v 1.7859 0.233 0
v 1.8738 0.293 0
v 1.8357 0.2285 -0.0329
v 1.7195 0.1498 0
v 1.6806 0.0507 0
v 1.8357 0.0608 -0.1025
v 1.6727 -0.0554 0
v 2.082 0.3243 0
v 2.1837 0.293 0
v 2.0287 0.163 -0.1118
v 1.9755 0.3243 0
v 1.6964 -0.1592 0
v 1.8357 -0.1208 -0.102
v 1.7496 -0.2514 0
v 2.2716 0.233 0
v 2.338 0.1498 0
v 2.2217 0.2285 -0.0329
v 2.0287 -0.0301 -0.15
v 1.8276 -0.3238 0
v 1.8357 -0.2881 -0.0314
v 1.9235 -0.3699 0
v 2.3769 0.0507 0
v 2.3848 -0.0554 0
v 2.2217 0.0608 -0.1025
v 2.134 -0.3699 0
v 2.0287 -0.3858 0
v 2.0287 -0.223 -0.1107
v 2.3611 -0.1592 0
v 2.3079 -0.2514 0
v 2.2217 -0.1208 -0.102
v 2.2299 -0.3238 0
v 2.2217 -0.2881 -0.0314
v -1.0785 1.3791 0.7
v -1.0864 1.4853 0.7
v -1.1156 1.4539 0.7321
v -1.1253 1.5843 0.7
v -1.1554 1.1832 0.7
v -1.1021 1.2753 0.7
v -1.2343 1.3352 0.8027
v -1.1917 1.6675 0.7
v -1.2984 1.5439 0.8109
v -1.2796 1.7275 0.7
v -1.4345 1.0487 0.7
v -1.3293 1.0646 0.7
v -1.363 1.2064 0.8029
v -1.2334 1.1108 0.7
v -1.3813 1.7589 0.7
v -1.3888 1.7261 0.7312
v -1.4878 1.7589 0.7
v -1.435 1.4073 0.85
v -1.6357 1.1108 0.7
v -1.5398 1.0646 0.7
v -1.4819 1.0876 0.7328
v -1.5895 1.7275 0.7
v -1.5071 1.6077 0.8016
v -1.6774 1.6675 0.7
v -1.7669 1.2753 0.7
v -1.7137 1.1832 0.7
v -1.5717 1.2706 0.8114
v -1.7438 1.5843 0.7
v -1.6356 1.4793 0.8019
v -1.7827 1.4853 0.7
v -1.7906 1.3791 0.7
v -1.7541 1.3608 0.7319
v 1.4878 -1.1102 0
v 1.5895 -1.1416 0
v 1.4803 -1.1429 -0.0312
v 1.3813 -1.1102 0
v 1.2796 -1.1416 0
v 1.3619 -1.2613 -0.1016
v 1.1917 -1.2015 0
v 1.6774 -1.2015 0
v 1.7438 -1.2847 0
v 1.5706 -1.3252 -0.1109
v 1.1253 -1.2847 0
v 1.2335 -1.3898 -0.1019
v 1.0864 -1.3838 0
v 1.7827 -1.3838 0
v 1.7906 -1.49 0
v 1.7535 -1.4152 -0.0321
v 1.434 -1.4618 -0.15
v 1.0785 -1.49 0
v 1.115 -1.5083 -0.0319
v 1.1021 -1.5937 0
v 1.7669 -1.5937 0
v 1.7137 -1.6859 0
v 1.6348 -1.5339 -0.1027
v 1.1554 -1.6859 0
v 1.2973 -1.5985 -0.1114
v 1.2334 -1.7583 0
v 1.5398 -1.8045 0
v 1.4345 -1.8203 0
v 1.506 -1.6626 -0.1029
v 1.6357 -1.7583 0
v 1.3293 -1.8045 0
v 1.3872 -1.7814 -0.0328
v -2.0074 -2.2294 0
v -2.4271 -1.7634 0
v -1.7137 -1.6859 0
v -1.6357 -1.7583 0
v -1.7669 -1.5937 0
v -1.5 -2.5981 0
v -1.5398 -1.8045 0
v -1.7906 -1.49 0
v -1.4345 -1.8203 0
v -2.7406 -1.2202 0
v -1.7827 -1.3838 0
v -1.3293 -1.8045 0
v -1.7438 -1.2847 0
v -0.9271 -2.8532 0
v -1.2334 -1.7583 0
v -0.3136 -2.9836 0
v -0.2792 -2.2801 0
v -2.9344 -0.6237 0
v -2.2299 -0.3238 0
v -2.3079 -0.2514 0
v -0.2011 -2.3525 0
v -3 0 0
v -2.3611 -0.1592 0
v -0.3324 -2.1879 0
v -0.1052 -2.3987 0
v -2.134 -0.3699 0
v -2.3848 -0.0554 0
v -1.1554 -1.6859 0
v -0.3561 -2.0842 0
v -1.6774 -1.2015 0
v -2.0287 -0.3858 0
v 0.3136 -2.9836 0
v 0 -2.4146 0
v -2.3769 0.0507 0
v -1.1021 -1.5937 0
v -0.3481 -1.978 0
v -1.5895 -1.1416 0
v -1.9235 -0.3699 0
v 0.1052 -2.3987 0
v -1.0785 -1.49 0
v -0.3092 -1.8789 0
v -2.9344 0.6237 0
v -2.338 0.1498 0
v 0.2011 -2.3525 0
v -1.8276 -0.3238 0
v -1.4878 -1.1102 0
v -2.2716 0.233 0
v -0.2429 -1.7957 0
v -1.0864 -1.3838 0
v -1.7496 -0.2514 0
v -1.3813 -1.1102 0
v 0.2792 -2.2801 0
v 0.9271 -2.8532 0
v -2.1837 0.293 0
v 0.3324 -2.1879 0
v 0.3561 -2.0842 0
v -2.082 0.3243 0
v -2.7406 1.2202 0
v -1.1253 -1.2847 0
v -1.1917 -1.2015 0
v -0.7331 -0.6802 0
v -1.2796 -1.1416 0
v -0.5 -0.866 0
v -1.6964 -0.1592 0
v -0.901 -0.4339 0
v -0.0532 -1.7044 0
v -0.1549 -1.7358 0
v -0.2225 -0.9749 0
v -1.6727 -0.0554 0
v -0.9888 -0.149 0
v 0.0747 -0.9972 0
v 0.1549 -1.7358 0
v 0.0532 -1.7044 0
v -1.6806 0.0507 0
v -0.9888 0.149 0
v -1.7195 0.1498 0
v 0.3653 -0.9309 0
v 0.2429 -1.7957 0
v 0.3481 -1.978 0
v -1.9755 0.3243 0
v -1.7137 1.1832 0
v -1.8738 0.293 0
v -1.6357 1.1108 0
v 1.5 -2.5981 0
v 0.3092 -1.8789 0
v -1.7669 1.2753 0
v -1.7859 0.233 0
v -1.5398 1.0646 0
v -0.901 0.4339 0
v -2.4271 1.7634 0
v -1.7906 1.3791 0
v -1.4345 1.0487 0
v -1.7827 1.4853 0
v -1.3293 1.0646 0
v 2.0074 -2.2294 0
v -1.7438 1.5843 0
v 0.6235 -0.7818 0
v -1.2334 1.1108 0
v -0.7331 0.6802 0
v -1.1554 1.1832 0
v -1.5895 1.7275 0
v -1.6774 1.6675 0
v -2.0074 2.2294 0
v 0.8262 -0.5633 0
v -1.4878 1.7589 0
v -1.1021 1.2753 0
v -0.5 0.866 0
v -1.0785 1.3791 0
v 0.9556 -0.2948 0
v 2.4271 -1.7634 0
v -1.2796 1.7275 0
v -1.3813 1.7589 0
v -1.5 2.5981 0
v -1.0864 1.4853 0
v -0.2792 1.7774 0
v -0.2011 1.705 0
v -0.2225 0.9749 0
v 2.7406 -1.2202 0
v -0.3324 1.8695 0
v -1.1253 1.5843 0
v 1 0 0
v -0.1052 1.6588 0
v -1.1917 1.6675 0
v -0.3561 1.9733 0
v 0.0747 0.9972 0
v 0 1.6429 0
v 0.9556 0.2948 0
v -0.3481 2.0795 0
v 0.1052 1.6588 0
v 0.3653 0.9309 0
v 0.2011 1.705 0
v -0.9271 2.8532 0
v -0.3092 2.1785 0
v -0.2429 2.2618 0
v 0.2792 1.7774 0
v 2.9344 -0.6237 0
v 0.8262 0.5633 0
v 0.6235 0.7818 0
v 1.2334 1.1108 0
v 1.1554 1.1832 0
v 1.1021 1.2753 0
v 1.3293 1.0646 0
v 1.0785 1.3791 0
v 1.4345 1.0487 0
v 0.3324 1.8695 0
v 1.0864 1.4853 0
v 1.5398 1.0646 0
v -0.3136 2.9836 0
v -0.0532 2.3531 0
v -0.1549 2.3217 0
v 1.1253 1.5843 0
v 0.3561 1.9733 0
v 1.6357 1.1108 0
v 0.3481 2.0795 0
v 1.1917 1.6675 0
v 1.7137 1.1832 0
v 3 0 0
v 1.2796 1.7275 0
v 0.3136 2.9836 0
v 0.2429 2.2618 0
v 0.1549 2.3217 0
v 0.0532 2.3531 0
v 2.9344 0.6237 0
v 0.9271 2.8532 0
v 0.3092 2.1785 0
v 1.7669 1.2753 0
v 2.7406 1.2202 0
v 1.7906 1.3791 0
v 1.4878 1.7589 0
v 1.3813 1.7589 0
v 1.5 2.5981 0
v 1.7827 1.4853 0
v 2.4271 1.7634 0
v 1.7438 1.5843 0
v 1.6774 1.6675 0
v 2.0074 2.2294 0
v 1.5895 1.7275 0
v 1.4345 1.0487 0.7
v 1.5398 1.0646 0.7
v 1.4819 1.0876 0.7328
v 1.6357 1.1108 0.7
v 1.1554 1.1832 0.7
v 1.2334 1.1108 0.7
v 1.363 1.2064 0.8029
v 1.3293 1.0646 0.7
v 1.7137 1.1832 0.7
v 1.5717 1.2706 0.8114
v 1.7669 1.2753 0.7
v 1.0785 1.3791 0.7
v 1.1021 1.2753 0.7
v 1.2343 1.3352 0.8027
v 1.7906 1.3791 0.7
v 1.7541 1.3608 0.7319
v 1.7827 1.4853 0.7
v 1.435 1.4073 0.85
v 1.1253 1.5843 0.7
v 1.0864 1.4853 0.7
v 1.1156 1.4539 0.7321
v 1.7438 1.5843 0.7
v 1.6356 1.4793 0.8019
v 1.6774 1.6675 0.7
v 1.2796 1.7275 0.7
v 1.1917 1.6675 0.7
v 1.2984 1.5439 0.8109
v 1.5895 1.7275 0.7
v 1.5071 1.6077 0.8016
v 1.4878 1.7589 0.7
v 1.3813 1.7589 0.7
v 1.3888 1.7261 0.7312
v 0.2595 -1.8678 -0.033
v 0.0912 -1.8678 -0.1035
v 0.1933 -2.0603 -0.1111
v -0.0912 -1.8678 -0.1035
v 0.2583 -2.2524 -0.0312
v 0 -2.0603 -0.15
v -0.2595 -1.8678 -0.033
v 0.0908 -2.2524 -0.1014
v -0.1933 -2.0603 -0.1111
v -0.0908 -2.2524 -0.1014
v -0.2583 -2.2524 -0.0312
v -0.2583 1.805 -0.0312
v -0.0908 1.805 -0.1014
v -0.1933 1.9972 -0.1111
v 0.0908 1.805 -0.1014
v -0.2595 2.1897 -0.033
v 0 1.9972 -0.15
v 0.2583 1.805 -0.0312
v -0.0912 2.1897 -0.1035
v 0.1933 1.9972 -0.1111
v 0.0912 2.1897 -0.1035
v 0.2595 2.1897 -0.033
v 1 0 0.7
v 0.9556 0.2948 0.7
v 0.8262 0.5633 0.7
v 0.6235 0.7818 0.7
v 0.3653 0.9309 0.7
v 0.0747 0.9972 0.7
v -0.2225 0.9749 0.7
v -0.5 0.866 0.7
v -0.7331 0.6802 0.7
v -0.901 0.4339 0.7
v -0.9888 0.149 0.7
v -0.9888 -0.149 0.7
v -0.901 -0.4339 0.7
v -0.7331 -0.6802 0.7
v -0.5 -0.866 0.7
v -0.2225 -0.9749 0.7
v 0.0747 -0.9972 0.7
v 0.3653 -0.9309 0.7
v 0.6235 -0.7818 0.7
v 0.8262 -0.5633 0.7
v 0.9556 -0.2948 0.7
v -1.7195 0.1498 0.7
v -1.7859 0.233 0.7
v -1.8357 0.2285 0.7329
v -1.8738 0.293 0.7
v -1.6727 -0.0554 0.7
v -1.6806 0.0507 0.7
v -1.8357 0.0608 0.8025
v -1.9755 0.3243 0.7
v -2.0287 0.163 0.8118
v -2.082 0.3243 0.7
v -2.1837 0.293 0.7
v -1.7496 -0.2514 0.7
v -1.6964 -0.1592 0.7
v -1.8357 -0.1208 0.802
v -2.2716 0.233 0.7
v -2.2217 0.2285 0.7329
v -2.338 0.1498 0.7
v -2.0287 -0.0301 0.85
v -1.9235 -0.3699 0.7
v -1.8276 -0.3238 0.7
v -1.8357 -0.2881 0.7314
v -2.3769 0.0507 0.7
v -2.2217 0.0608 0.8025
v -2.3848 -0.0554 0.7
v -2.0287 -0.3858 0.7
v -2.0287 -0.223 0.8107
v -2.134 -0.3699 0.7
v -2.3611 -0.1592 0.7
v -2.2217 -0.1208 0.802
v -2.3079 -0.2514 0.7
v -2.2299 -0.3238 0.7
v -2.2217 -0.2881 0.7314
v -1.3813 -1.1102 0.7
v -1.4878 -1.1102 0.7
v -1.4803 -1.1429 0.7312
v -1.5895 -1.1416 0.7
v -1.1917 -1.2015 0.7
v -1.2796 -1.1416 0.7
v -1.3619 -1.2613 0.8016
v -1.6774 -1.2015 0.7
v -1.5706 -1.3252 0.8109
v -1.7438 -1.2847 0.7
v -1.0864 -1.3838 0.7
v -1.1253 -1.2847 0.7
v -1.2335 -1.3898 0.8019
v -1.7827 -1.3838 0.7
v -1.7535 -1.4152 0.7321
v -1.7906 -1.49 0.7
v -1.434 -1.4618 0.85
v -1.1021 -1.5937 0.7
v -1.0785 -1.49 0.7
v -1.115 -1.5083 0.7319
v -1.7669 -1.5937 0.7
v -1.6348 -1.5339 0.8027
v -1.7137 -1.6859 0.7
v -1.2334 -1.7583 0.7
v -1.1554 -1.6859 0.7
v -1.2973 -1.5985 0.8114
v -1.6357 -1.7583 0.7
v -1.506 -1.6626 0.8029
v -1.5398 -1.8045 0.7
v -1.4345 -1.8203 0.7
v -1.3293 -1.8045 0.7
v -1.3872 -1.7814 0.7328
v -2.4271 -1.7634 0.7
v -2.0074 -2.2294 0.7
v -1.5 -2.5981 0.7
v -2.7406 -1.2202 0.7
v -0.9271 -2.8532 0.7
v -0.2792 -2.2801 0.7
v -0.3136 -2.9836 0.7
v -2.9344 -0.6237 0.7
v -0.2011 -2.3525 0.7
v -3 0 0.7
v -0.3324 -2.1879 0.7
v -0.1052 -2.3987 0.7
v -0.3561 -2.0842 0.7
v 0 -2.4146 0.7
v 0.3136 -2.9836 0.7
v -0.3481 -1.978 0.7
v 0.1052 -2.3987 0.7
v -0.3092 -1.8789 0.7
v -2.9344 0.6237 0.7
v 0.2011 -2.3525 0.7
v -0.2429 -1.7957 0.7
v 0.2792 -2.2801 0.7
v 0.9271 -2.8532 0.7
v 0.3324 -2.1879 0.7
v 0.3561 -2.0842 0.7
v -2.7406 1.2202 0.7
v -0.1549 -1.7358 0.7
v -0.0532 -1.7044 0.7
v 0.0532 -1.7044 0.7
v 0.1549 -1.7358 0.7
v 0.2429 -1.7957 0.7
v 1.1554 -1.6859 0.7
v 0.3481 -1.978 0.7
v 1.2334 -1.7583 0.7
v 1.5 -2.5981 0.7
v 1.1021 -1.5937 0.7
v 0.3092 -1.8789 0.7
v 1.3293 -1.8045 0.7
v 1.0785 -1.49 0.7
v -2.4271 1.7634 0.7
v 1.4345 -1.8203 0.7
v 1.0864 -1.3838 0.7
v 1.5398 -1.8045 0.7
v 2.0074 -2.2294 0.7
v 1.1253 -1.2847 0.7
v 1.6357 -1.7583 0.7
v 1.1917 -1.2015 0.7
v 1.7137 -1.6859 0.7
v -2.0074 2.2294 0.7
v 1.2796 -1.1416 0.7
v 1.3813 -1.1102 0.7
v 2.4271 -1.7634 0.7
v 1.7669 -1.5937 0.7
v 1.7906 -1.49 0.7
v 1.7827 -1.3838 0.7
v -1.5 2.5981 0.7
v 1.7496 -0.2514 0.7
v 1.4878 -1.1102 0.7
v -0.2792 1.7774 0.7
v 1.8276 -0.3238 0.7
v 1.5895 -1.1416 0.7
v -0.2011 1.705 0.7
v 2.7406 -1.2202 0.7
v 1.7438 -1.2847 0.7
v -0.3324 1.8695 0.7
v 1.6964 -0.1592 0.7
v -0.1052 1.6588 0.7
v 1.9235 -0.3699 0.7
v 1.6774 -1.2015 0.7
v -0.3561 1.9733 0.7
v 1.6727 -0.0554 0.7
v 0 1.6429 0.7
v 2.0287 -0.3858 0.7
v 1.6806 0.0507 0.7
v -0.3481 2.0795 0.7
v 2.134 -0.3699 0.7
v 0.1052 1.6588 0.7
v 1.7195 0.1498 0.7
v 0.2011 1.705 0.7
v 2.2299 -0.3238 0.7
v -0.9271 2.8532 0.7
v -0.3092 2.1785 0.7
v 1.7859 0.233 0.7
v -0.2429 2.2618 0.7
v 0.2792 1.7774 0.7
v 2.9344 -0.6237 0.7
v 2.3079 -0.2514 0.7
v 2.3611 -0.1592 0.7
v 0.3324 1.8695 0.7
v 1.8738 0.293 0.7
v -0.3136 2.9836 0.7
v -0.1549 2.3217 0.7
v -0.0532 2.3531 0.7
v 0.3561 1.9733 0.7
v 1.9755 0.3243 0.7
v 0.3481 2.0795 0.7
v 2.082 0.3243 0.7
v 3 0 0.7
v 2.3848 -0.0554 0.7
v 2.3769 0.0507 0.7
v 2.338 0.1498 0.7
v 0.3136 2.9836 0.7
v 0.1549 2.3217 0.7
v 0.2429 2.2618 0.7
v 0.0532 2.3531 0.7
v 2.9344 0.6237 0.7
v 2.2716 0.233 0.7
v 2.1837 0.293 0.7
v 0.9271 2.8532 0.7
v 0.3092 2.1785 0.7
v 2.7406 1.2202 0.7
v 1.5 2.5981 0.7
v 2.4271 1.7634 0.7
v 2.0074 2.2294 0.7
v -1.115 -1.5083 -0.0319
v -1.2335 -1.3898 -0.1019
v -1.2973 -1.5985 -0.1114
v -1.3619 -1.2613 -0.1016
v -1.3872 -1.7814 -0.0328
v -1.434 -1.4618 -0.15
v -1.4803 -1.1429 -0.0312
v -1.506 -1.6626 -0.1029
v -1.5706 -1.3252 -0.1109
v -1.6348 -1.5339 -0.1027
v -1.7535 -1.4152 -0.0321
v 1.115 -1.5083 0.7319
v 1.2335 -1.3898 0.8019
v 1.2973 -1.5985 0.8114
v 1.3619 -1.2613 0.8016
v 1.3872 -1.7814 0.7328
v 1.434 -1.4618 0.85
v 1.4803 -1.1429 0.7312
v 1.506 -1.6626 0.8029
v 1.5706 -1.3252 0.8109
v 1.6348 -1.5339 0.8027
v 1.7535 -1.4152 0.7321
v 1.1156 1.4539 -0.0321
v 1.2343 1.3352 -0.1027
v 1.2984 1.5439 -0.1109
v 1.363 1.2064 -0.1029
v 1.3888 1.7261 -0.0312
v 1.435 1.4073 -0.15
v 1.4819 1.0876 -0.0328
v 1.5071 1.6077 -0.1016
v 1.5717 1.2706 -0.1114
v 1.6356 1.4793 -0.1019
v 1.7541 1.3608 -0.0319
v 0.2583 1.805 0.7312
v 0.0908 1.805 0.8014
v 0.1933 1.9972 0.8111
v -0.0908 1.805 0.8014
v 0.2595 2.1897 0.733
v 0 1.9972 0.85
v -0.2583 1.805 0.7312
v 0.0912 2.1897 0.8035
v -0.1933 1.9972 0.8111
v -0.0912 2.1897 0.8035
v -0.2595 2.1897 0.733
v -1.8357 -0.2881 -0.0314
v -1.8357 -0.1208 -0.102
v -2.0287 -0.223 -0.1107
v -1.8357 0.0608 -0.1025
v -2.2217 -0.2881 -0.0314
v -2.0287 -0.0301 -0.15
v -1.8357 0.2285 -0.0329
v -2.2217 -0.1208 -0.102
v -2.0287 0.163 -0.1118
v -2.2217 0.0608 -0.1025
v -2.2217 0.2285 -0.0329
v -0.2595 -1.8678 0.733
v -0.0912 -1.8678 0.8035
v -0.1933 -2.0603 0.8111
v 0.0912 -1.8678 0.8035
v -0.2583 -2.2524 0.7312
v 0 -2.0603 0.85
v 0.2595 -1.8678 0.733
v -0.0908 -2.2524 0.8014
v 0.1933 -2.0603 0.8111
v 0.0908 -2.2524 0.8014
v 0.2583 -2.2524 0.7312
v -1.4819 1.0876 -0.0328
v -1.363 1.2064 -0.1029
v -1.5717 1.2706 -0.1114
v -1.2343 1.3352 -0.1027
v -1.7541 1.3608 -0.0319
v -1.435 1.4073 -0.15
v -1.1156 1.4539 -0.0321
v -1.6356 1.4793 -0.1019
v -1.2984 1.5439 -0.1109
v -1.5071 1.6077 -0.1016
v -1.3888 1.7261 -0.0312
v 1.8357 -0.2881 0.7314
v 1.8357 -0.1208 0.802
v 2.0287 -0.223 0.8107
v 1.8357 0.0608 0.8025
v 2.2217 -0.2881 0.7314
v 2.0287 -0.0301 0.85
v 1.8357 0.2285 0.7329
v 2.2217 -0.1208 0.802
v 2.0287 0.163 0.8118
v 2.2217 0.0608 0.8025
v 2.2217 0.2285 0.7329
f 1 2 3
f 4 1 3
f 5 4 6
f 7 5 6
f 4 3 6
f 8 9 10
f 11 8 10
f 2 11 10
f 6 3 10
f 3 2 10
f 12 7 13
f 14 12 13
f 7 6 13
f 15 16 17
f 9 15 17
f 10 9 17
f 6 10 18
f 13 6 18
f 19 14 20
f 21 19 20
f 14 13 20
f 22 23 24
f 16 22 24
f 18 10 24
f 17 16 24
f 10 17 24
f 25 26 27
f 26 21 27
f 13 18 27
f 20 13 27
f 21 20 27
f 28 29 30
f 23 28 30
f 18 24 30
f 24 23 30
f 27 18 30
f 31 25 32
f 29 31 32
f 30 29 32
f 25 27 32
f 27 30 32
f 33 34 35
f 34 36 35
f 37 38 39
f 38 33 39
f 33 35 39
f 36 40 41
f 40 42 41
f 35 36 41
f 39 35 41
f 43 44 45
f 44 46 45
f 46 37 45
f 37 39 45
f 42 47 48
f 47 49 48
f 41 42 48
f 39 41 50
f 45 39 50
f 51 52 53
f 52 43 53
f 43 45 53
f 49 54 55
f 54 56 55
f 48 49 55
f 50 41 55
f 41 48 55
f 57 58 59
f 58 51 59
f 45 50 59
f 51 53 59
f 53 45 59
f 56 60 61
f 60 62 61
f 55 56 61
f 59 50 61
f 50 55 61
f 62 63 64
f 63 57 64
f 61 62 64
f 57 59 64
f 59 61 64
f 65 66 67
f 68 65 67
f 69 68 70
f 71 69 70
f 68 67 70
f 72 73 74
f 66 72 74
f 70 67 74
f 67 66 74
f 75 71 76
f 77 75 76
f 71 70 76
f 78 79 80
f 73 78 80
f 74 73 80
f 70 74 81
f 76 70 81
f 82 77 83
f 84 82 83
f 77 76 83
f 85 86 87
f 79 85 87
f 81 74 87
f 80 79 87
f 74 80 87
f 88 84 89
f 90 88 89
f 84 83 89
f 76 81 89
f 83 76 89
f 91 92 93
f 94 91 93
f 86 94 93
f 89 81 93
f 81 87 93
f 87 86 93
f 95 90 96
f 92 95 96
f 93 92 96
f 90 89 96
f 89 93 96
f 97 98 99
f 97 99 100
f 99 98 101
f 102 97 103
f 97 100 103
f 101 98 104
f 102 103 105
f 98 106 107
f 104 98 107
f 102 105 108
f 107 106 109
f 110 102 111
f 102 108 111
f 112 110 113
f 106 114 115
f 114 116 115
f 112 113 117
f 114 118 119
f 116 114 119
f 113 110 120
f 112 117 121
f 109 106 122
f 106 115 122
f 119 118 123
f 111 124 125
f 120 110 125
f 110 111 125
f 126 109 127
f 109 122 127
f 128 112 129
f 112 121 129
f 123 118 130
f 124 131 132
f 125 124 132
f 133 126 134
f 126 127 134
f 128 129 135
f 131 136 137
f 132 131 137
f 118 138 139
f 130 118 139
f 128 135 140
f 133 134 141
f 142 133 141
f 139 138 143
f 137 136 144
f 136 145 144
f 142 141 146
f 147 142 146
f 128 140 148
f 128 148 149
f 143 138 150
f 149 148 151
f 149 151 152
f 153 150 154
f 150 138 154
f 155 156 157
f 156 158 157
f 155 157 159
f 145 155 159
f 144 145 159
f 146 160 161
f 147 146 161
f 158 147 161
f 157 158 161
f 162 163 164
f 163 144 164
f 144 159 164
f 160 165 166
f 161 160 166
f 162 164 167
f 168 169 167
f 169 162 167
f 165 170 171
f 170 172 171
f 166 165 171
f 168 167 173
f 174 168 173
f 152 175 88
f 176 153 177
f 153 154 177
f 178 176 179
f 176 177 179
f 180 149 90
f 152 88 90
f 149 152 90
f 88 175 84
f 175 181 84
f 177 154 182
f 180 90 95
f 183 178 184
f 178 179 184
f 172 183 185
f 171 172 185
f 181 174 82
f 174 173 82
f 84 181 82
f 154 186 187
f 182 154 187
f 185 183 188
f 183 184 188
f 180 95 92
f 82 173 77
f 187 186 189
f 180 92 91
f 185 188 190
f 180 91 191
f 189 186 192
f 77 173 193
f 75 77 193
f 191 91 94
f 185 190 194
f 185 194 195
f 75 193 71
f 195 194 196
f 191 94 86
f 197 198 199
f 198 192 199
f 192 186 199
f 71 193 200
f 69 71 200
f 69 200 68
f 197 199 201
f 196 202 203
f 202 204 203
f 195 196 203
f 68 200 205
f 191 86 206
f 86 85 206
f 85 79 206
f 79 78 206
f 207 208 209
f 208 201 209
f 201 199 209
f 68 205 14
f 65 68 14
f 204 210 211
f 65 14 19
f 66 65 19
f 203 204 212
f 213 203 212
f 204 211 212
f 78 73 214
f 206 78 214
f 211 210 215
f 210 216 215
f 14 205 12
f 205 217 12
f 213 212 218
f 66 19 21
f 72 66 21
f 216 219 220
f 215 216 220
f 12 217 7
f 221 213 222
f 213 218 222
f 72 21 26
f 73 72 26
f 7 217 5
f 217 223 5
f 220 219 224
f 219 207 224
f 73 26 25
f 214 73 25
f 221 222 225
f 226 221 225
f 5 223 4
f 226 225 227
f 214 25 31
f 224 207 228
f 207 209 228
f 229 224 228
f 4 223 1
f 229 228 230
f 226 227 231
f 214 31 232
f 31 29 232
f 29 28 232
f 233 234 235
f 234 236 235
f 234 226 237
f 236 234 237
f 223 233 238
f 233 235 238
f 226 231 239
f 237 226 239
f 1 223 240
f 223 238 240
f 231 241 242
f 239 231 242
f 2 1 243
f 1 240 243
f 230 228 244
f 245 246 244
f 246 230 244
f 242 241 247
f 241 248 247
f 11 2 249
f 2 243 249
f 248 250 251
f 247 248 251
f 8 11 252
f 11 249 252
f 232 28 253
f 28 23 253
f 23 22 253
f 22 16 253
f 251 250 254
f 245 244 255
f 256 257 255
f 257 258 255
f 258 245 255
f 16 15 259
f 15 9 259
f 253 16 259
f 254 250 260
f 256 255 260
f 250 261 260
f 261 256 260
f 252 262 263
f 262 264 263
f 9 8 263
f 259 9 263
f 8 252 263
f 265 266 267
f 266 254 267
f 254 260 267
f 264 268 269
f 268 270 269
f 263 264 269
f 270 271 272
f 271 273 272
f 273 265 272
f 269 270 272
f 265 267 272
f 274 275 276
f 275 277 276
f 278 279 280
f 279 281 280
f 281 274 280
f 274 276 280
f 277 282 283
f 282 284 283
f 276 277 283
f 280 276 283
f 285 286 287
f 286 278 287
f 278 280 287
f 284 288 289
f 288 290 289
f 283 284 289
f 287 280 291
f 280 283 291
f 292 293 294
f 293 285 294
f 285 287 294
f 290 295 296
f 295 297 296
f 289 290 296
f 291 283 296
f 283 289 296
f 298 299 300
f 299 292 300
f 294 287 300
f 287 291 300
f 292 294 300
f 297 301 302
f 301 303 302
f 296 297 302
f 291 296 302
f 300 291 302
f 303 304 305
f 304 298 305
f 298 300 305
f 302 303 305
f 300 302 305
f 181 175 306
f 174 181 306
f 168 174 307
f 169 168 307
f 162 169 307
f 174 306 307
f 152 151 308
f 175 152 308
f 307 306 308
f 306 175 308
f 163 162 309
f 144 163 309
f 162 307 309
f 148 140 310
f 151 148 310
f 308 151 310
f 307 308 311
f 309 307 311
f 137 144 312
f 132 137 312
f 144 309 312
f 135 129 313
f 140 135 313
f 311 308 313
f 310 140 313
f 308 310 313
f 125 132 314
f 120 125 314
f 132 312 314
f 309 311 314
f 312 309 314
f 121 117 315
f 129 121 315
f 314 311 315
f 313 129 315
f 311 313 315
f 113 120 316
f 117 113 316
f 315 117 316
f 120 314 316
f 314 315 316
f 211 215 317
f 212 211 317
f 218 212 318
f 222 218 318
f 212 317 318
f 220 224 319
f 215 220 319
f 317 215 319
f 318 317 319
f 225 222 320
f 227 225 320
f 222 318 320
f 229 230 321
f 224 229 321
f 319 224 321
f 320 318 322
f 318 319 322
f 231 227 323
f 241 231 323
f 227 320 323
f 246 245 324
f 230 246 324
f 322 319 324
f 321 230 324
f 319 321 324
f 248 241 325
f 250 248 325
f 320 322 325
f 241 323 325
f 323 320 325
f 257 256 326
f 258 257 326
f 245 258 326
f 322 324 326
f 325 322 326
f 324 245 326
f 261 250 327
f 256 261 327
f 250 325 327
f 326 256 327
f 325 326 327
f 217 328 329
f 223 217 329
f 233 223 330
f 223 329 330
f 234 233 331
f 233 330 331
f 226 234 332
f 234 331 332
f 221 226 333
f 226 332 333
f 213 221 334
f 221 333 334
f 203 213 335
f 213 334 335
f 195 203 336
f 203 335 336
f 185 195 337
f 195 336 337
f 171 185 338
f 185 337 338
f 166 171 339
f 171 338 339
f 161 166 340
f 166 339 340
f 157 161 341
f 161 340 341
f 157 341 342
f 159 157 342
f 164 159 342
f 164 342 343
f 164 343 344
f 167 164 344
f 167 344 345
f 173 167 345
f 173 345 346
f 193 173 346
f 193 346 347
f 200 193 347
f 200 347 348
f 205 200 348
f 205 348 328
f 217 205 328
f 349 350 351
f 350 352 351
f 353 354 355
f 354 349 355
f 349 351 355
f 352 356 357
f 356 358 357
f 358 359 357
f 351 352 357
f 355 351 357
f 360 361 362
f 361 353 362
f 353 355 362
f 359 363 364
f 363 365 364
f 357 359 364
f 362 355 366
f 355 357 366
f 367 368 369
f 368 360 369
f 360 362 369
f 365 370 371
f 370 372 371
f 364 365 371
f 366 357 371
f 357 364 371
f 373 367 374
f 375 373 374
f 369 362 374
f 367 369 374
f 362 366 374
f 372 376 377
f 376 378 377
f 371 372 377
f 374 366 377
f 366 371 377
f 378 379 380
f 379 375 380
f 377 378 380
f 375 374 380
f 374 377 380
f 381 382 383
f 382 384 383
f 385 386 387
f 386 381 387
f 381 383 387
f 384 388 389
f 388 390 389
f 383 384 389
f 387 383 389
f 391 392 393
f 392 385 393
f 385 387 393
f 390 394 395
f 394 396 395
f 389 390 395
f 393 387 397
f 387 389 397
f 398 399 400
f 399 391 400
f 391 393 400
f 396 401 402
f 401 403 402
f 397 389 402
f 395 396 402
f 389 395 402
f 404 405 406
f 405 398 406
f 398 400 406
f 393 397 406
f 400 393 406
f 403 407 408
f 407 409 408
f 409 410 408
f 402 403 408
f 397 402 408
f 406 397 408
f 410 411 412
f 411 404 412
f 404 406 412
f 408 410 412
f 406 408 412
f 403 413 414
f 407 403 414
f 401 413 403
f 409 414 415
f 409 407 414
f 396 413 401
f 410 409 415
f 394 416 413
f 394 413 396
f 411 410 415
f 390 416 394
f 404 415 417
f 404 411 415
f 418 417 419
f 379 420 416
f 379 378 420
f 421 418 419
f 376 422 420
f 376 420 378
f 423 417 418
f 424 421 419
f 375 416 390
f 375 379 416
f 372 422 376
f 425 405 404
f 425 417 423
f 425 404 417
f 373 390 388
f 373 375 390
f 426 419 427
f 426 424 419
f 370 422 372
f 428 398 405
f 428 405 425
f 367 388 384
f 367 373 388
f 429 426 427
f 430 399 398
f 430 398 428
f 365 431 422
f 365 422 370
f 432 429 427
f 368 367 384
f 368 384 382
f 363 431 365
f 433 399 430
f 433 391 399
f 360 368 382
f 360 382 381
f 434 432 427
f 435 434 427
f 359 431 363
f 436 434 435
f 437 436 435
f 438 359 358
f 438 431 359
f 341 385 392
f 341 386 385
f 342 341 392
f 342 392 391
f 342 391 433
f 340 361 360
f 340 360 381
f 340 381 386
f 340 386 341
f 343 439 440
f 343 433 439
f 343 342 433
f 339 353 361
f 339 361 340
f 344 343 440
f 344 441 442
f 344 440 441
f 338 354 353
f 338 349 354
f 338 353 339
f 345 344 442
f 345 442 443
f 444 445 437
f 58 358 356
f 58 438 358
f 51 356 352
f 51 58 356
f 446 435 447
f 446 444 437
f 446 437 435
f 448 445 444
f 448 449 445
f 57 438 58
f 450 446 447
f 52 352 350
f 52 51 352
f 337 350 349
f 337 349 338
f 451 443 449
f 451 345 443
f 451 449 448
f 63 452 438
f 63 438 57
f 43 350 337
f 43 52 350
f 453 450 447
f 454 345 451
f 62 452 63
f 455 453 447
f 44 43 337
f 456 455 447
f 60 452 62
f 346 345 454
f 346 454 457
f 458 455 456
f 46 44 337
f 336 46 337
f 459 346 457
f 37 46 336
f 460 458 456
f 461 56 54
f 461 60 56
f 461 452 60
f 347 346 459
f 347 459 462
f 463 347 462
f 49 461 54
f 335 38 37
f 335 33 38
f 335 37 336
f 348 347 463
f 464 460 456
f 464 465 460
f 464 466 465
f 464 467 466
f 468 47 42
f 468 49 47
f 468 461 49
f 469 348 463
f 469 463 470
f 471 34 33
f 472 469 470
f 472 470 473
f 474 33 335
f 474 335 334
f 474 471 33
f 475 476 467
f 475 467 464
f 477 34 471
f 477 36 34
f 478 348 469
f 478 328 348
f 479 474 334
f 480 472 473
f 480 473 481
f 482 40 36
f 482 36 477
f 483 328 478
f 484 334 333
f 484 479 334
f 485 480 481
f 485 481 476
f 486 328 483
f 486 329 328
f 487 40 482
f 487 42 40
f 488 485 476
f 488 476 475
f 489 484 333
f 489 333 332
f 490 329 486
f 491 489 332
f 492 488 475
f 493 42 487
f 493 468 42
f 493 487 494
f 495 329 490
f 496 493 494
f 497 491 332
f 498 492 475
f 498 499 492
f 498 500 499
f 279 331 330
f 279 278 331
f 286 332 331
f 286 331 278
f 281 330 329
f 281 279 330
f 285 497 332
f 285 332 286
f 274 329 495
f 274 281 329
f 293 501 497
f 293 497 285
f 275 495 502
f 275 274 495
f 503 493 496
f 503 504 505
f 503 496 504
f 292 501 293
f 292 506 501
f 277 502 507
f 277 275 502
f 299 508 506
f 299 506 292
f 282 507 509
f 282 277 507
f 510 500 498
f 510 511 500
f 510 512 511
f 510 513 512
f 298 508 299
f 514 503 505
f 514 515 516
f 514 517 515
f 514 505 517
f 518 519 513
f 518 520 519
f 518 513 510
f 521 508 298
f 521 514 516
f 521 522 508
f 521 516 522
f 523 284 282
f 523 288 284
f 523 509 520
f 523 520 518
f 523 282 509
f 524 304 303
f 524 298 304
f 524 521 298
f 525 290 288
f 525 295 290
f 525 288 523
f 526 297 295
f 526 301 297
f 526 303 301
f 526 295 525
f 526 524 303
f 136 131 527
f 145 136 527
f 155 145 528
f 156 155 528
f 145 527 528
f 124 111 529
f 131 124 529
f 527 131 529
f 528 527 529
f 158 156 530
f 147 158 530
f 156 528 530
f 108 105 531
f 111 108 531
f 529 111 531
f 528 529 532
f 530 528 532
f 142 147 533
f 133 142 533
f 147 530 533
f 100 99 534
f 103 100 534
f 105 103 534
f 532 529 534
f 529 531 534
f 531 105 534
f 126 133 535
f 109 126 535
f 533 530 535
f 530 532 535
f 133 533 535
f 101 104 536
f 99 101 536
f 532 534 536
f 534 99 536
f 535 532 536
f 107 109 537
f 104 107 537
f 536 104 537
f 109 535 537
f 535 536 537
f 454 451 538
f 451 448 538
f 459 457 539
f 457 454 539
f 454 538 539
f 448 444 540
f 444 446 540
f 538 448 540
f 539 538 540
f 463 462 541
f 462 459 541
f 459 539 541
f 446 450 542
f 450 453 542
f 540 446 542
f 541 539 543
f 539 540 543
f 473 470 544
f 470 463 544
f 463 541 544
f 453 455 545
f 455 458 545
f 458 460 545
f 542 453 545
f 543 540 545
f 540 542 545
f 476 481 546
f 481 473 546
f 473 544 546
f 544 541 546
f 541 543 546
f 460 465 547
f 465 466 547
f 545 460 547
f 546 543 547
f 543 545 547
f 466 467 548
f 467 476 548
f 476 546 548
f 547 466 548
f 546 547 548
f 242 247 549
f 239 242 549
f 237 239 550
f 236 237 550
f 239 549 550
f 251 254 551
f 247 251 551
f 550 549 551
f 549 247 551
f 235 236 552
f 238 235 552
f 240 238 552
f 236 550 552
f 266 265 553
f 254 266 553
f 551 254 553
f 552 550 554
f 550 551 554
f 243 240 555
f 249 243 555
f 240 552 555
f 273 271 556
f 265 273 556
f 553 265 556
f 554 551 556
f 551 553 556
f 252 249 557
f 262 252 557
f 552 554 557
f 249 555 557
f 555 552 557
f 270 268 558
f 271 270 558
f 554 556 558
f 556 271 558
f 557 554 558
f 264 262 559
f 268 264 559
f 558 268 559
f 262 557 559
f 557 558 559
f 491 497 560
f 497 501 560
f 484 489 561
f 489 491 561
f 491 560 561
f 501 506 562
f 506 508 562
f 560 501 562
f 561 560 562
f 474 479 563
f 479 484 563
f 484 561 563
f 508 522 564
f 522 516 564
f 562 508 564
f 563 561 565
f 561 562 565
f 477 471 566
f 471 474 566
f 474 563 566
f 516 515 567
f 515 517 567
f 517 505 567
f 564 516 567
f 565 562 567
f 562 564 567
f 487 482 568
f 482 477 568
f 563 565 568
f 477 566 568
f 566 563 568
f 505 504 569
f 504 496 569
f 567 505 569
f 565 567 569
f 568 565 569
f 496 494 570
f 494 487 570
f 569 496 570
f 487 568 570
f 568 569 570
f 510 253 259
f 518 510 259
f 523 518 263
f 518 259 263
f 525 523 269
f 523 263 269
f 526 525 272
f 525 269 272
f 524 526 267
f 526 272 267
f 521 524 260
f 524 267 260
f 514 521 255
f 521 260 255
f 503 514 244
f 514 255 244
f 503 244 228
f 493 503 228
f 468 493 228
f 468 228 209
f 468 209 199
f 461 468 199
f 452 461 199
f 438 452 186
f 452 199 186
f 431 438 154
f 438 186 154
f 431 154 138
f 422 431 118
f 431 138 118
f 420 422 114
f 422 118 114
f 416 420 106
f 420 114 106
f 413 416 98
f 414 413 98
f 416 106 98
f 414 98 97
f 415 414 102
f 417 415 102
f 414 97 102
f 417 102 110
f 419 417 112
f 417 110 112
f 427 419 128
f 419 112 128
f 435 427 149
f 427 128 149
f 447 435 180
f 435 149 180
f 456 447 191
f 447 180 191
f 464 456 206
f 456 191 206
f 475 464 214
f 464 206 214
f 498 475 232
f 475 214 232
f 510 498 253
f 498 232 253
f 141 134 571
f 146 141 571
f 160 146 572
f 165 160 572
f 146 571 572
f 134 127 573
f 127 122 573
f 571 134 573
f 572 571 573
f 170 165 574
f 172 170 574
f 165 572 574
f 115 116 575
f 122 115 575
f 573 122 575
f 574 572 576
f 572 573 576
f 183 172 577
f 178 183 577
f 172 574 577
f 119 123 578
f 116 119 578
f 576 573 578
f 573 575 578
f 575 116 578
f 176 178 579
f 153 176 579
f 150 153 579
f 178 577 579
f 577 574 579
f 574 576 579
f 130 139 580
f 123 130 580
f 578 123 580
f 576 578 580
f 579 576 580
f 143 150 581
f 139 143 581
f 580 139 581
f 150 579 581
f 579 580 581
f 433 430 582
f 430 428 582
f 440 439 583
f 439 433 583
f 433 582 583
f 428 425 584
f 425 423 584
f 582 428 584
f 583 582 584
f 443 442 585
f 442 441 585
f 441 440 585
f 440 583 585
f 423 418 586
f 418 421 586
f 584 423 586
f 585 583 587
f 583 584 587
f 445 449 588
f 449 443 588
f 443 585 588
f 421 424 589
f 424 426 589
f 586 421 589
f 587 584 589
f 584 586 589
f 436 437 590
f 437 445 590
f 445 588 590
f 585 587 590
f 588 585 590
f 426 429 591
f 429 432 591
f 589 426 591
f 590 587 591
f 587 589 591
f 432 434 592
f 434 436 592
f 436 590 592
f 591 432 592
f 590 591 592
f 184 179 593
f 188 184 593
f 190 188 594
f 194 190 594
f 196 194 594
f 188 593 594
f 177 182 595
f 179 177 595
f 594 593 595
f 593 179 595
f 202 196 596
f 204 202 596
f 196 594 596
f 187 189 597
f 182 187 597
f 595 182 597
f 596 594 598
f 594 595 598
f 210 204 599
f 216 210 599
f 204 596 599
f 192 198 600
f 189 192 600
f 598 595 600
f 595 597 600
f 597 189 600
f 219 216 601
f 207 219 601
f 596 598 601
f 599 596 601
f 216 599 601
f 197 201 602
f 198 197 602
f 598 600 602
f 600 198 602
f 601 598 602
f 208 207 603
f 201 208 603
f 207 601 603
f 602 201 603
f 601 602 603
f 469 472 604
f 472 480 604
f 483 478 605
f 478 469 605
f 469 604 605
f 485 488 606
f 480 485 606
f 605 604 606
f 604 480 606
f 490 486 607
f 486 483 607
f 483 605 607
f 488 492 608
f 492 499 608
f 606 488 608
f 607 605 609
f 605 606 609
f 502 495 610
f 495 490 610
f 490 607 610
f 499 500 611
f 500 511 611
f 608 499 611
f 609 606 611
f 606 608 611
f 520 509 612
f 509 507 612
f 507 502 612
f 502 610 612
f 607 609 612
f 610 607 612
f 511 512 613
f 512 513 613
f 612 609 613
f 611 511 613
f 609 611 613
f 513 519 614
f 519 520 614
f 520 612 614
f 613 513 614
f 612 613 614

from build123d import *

# Parameters (mm, degrees)
SKETCH_1_R               = 3
EXTRUDE_1_DEPTH          = 0.7
PATTERN_CIRCULAR_1_COUNT = 8
SKETCH_3_R               = 1
CUT_EXTRUDE_1_DEPTH      = 5.326950427


with BuildPart() as part:
    # 草图1 → 凸台-拉伸1 (new body)
    with BuildSketch(Plane.XY):
        Circle(SKETCH_1_R)
    extrude(amount=EXTRUDE_1_DEPTH)

    # 草图2 → 旋转1 (revolve)
    with BuildSketch(Plane.XY.offset(0.35)):
        with BuildLine():
            Line((0, 2.5), (0, 1.5))
            ThreePointArc((0, 1.5), (-0.5, 2), (0, 2.5))
        make_face()
    revolve_1 = revolve(axis=Axis((0, 2.5, 0.35), (0, -1, 0)))

    # 阵列(圆周)1: 旋转1 ×8 about axis
    pattern_circular_1_axis = Axis((0, -0.02874049, 0), (0, 0, 1))
    for i in range(1, PATTERN_CIRCULAR_1_COUNT):
        add(revolve_1.rotate(pattern_circular_1_axis, i * 360 / PATTERN_CIRCULAR_1_COUNT))

    # 草图3 → 切除-拉伸1 (cut, through all)
    with BuildSketch(Plane.XY.offset(0.7)):
        Circle(SKETCH_3_R)
    extrude(amount=-CUT_EXTRUDE_1_DEPTH, mode=Mode.SUBTRACT)


solid = part.part
